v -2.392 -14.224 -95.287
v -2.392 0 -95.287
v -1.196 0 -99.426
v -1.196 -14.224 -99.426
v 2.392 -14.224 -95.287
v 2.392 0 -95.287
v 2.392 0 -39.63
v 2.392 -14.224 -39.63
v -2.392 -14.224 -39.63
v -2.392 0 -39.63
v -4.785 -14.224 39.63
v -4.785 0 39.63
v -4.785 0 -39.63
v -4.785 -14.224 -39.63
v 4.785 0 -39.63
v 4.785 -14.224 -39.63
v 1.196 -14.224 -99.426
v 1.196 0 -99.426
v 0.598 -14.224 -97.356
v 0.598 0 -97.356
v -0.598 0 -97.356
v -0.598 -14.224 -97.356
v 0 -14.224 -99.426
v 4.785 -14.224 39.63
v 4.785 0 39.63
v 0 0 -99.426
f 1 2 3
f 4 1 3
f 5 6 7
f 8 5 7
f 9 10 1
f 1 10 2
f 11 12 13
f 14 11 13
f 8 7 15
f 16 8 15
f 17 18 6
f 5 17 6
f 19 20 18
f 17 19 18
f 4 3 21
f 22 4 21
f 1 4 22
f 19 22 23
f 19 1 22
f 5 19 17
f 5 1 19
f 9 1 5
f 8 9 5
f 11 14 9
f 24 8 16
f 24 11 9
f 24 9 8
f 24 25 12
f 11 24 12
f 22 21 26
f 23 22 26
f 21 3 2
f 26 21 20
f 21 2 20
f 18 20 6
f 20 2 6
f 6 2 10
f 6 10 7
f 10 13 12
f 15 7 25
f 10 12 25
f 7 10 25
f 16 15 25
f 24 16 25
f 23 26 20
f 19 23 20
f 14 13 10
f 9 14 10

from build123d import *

# Parameters (mm, degrees)
F1_DEPTH = 14.224


with BuildPart() as f1:
    # F0 (on Front) → F1 (new body)
    with BuildSketch(Plane.XZ):
        Polygon((4.784628, 39.629921), (-4.784628, 39.629921), (-4.784628, -39.629921), (-2.392314, -39.629921), (0, -39.629921), (2.392314, -39.629921), (4.784628, -39.629921), align=None)
        Polygon((0, -39.629921), (-2.392314, -39.629921), (-2.392314, -95.287018), (-1.196157, -99.425659), (-0.598078, -97.356338), (0, -95.287018), (0.598078, -97.356338), (1.196157, -99.425659), (2.392314, -95.287018), (2.392314, -39.629921), align=None)
        Polygon((0, -95.287018), (-0.598078, -97.356338), (0, -99.425659), (0.598078, -97.356338), align=None)
    extrude(amount=F1_DEPTH)


solid = f1.part
